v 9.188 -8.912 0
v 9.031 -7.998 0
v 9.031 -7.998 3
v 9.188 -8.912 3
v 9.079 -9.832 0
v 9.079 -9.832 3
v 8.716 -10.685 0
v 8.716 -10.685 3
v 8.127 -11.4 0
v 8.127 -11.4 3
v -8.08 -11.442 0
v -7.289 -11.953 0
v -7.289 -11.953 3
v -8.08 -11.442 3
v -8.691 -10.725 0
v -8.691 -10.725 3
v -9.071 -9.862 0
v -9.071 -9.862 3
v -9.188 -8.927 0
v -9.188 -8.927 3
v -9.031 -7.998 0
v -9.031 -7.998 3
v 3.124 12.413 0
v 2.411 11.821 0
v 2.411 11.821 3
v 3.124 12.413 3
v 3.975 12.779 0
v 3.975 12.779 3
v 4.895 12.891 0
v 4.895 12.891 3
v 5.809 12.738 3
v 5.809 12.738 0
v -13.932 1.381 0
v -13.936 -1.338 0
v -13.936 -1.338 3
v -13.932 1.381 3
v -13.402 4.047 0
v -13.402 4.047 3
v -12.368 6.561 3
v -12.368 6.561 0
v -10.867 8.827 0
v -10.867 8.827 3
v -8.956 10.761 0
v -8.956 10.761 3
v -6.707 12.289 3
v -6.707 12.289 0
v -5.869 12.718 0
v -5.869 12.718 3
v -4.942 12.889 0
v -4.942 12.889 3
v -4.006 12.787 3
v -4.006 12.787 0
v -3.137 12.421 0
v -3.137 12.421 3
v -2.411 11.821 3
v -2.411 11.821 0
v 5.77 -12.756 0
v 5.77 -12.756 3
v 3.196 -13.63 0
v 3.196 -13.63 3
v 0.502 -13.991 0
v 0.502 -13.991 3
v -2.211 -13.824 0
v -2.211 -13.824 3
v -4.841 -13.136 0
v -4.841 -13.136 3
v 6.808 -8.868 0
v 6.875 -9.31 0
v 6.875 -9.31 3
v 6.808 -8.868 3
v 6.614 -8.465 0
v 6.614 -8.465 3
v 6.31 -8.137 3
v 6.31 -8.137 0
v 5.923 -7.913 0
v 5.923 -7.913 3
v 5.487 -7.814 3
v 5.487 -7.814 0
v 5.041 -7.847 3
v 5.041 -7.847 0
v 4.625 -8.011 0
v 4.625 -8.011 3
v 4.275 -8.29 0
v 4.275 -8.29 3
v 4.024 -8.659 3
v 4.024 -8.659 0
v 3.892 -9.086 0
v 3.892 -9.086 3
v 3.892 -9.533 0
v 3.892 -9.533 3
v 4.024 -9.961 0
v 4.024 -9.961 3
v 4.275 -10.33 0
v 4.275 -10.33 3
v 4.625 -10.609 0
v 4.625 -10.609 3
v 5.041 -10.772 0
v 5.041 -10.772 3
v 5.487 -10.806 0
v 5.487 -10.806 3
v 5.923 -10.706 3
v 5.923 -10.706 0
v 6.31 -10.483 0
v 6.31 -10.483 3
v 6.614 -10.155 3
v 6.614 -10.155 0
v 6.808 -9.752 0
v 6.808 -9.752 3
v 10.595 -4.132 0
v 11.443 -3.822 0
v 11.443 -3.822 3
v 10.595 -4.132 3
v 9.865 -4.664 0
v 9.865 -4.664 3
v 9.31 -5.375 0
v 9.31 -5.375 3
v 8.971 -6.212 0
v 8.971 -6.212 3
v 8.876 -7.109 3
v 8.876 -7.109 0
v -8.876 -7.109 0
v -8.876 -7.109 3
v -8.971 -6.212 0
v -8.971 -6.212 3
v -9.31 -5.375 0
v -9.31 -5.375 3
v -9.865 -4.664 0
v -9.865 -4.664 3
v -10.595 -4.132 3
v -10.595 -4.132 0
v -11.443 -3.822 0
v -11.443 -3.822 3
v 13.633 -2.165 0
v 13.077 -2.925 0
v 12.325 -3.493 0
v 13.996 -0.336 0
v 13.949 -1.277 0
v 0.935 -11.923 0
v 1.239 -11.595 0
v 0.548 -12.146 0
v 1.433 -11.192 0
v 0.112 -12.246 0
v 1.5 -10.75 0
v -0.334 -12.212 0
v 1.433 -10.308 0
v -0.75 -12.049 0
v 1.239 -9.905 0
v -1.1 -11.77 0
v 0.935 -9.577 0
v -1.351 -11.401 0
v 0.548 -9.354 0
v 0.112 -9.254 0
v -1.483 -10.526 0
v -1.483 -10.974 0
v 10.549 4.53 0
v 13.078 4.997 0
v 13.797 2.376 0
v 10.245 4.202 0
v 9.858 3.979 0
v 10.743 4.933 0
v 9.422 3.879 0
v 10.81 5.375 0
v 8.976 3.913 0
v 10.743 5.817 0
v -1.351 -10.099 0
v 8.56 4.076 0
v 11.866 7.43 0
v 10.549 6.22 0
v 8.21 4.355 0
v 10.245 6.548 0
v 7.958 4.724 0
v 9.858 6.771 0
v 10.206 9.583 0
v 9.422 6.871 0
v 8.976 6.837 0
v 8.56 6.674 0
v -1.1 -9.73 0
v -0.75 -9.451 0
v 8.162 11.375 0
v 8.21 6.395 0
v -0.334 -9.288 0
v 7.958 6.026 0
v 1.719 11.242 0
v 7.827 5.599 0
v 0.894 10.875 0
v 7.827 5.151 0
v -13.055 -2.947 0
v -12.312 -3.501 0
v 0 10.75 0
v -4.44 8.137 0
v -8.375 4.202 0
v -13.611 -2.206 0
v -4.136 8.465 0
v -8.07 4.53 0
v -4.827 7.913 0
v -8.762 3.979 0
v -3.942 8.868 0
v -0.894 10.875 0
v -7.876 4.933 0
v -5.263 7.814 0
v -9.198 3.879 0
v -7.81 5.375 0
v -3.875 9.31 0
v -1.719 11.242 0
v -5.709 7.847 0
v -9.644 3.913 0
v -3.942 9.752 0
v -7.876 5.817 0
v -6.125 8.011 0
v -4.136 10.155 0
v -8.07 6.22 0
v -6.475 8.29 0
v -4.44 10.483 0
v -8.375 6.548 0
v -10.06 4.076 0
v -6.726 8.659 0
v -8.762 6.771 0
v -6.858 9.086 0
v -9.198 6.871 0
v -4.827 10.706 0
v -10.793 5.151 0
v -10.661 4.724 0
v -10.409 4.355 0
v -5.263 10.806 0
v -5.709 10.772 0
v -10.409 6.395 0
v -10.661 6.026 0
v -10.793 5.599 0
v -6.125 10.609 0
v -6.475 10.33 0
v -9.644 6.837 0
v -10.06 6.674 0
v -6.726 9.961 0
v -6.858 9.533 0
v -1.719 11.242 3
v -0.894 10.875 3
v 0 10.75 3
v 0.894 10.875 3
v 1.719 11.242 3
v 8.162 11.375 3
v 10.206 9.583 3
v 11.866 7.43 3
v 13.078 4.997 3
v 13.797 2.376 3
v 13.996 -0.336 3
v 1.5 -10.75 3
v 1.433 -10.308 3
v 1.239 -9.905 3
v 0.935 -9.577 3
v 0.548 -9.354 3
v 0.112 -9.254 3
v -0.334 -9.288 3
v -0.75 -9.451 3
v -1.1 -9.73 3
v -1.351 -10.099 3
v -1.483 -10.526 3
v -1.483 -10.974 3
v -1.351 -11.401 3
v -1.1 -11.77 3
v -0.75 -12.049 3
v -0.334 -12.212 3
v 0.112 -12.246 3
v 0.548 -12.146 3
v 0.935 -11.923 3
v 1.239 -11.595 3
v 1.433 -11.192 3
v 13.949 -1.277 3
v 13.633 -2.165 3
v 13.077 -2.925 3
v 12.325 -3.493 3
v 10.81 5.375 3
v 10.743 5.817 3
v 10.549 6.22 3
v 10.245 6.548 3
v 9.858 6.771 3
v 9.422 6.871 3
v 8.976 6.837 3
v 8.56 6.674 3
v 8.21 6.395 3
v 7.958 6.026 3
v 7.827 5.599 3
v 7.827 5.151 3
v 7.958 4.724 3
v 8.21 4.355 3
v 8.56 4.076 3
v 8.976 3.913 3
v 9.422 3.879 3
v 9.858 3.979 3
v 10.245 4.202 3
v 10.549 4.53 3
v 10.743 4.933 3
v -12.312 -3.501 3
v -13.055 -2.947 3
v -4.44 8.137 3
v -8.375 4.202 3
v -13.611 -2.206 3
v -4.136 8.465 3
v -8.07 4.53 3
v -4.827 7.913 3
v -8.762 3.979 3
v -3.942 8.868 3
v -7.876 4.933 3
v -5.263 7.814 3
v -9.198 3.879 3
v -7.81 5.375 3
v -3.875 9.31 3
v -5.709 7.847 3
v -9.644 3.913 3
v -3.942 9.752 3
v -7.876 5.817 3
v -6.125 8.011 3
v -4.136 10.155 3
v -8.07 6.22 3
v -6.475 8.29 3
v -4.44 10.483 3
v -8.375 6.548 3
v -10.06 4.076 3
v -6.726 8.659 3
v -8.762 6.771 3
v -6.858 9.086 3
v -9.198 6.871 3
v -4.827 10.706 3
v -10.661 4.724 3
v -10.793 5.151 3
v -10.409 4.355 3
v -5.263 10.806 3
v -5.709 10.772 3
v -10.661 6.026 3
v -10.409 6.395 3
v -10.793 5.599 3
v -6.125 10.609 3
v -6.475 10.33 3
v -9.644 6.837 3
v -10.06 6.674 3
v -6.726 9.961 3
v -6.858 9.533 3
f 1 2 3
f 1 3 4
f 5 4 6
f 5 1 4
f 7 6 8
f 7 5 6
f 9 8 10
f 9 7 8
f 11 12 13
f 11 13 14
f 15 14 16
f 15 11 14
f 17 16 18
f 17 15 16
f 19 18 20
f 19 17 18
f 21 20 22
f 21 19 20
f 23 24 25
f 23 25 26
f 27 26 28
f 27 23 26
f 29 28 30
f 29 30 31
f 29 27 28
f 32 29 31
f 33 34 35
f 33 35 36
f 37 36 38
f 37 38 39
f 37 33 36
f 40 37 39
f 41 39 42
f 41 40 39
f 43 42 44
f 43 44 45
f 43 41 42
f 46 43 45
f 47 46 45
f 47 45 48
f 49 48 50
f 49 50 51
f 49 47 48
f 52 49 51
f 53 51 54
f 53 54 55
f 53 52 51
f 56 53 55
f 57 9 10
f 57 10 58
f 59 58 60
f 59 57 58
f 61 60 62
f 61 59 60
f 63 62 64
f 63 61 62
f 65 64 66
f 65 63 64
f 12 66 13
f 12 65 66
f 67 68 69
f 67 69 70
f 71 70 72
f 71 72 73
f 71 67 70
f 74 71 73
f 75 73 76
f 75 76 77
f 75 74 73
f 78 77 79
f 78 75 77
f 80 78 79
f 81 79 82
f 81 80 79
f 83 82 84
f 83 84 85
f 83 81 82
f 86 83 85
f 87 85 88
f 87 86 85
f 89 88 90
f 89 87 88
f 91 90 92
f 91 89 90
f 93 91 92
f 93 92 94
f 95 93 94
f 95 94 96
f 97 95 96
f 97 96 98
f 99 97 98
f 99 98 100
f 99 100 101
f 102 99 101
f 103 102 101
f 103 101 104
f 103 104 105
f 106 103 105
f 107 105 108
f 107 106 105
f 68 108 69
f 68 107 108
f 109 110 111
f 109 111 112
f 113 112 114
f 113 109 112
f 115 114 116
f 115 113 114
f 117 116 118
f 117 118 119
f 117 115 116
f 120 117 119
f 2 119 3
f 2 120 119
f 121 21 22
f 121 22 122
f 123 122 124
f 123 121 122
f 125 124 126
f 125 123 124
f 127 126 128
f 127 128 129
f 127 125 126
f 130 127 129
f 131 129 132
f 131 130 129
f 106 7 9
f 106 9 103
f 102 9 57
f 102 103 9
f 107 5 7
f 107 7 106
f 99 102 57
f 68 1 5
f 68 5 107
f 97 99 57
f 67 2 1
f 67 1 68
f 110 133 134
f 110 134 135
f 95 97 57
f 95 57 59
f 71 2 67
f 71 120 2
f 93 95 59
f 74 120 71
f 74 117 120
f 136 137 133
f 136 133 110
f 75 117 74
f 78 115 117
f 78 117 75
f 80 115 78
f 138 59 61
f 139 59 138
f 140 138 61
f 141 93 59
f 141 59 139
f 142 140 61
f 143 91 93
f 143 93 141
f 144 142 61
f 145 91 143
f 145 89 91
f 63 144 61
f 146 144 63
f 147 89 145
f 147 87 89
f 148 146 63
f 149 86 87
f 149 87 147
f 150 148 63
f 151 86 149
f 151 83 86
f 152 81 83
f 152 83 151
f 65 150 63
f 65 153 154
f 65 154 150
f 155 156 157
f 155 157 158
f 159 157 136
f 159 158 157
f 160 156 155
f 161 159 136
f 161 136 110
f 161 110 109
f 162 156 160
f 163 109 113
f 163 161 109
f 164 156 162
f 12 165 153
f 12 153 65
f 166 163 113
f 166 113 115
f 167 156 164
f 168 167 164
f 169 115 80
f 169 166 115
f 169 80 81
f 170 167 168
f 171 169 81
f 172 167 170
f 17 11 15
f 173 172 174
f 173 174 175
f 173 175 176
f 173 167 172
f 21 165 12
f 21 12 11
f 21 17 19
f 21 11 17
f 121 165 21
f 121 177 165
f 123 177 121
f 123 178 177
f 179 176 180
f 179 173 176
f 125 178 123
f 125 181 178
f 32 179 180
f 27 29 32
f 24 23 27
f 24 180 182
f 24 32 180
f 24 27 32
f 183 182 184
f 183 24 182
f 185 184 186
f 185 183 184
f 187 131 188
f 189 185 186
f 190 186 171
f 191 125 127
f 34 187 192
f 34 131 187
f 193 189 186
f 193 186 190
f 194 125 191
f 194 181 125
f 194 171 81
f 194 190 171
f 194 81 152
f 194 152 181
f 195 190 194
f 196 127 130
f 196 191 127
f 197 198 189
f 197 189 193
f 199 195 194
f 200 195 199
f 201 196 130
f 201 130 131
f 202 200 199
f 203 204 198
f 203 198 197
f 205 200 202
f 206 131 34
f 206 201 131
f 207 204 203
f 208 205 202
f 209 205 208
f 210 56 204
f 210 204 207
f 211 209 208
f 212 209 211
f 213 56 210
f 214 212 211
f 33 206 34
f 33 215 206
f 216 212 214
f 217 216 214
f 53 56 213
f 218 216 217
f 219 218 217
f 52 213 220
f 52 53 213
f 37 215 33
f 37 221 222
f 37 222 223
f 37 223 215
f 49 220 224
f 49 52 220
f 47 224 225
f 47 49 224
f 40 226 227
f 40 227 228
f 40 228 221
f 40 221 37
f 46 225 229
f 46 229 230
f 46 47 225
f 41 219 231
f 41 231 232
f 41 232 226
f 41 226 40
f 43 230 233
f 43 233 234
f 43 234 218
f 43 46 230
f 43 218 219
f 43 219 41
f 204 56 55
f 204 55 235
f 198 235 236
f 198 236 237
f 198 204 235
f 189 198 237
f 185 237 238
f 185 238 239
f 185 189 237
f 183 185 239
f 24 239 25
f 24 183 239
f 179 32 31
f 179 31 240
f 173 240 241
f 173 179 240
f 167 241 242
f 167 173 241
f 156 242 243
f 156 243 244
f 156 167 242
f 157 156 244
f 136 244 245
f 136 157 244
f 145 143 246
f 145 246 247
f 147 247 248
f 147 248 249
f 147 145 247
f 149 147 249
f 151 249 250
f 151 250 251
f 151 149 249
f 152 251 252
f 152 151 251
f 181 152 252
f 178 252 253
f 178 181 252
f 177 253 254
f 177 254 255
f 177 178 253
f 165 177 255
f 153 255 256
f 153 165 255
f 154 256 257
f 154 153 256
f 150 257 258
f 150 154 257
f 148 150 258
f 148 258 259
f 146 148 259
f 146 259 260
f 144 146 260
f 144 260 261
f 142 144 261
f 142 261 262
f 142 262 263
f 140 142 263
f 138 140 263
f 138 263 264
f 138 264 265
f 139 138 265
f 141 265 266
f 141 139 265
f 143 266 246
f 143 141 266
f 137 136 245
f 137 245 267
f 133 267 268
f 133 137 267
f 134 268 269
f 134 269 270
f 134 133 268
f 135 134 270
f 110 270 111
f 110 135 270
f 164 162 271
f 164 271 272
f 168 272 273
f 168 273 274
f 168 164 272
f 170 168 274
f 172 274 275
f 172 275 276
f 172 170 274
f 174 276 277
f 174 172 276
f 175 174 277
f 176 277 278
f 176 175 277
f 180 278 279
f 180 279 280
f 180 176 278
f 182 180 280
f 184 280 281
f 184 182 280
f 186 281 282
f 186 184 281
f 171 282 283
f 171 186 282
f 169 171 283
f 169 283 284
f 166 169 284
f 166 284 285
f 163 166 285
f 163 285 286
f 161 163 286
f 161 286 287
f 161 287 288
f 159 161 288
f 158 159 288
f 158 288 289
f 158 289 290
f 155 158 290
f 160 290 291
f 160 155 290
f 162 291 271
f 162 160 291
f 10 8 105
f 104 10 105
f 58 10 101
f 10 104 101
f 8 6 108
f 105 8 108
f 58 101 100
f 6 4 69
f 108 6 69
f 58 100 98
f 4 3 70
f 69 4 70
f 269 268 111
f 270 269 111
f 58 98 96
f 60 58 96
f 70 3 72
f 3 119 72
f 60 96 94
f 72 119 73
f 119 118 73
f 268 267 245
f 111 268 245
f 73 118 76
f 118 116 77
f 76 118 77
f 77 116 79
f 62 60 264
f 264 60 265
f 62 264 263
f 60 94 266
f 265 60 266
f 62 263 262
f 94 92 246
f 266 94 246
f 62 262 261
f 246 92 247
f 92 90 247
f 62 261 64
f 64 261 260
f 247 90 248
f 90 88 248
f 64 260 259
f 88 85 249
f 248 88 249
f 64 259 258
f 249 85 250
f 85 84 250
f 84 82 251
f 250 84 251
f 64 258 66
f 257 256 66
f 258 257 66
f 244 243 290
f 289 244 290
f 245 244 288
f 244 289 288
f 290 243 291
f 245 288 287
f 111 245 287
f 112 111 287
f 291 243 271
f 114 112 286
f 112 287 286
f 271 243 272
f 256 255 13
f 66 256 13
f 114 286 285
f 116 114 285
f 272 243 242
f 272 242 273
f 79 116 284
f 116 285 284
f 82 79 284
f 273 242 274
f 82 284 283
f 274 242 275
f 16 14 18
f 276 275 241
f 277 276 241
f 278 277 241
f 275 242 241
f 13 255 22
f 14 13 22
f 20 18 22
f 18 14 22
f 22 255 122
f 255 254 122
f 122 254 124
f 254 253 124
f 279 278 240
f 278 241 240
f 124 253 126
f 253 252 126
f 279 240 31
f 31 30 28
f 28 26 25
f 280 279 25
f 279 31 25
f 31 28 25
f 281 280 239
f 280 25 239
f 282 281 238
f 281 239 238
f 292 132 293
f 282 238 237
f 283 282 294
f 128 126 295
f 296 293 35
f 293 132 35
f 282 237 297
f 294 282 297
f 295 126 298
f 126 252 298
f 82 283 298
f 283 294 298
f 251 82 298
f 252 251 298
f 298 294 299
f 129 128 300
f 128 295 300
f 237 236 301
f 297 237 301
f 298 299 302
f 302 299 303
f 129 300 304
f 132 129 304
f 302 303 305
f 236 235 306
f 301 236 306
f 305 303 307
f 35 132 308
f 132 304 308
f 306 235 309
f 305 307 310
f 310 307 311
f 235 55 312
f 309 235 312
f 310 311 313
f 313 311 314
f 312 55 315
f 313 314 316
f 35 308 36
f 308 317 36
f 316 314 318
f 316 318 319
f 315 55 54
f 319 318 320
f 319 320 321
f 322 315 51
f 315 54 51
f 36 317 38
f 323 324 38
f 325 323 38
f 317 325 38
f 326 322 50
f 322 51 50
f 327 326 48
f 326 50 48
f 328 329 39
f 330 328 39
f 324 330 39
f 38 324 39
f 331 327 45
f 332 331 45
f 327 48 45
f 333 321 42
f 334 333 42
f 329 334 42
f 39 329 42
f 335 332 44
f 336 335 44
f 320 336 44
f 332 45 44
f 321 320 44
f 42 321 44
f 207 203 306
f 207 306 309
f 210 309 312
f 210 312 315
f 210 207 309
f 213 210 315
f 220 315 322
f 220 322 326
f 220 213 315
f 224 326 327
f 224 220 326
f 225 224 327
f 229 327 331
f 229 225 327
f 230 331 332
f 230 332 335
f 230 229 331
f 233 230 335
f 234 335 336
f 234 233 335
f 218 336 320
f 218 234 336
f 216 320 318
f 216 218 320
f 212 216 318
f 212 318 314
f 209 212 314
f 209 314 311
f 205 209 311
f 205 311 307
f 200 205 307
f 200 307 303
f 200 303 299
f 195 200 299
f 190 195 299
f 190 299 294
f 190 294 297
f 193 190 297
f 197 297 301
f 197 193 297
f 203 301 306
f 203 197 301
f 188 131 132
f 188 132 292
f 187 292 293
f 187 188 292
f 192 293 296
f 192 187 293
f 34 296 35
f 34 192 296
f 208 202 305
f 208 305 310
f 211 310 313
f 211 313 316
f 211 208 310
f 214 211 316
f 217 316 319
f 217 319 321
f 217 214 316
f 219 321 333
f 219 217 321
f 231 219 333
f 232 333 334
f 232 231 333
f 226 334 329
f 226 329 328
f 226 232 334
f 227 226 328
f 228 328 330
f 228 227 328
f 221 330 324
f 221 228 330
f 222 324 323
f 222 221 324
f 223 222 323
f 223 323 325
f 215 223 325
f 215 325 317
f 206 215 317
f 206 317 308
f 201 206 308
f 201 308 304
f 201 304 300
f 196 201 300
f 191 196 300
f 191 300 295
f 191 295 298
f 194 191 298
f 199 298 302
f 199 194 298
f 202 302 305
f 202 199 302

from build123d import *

# Parameters (mm, degrees)
ESQUISSE1_R        = 1.5
BOSS_EXTRU_2_DEPTH = 3


with BuildPart() as part:
    # Esquisse1 → Boss.-Extru.2 (new body)
    with BuildSketch(Plane.XY):
        with BuildLine():
            ThreePointArc((-2.411034891, 11.820685714), (0, 10.75), (2.411034891, 11.820685714))
            ThreePointArc((2.411034891, 11.820685714), (3.975330286, 12.779130538), (5.80943088, 12.737759334))
            ThreePointArc((5.80943088, 12.737759334), (11.865562564, 7.430237213), (13.995977593, -0.335575935))
            ThreePointArc((13.995977593, -0.335575935), (13.382779595, -2.564868949), (11.442531564, -3.822325392))
            ThreePointArc((11.442531564, -3.822325392), (9.309773091, -5.375), (9.031496673, -7.998360322))
            ThreePointArc((9.031496673, -7.998360322), (9.079386541, -9.832302285), (8.126507731, -11.399994391))
            ThreePointArc((8.126507731, -11.399994391), (0.5019929, -13.990997217), (-7.288606081, -11.953084179))
            ThreePointArc((-7.288606081, -11.953084179), (-8.912631465, -10.307392628), (-9.031496673, -7.998360322))
            ThreePointArc((-9.031496673, -7.998360322), (-9.309773091, -5.375), (-11.442531564, -3.822325392))
            ThreePointArc((-11.442531564, -3.822325392), (-13.054716827, -2.946828253), (-13.935938611, -1.337764944))
            ThreePointArc((-13.935938611, -1.337764944), (-12.367555464, 6.560760004), (-6.707371512, 12.288660114))
            ThreePointArc((-6.707371512, 12.288660114), (-4.47014813, 12.872261577), (-2.411034891, 11.820685714))
        make_face()
        with Locations((9.309773091, 5.375)):
            Circle(ESQUISSE1_R, mode=Mode.SUBTRACT)
        with Locations((0, -10.75)):
            Circle(ESQUISSE1_R, mode=Mode.SUBTRACT)
        with Locations((-9.309773091, 5.375)):
            Circle(ESQUISSE1_R, mode=Mode.SUBTRACT)
        with Locations((5.375, -9.309773091)):
            Circle(ESQUISSE1_R, mode=Mode.SUBTRACT)
        with Locations((-5.375, 9.309773091)):
            Circle(ESQUISSE1_R, mode=Mode.SUBTRACT)
    extrude(amount=BOSS_EXTRU_2_DEPTH)


solid = part.part
